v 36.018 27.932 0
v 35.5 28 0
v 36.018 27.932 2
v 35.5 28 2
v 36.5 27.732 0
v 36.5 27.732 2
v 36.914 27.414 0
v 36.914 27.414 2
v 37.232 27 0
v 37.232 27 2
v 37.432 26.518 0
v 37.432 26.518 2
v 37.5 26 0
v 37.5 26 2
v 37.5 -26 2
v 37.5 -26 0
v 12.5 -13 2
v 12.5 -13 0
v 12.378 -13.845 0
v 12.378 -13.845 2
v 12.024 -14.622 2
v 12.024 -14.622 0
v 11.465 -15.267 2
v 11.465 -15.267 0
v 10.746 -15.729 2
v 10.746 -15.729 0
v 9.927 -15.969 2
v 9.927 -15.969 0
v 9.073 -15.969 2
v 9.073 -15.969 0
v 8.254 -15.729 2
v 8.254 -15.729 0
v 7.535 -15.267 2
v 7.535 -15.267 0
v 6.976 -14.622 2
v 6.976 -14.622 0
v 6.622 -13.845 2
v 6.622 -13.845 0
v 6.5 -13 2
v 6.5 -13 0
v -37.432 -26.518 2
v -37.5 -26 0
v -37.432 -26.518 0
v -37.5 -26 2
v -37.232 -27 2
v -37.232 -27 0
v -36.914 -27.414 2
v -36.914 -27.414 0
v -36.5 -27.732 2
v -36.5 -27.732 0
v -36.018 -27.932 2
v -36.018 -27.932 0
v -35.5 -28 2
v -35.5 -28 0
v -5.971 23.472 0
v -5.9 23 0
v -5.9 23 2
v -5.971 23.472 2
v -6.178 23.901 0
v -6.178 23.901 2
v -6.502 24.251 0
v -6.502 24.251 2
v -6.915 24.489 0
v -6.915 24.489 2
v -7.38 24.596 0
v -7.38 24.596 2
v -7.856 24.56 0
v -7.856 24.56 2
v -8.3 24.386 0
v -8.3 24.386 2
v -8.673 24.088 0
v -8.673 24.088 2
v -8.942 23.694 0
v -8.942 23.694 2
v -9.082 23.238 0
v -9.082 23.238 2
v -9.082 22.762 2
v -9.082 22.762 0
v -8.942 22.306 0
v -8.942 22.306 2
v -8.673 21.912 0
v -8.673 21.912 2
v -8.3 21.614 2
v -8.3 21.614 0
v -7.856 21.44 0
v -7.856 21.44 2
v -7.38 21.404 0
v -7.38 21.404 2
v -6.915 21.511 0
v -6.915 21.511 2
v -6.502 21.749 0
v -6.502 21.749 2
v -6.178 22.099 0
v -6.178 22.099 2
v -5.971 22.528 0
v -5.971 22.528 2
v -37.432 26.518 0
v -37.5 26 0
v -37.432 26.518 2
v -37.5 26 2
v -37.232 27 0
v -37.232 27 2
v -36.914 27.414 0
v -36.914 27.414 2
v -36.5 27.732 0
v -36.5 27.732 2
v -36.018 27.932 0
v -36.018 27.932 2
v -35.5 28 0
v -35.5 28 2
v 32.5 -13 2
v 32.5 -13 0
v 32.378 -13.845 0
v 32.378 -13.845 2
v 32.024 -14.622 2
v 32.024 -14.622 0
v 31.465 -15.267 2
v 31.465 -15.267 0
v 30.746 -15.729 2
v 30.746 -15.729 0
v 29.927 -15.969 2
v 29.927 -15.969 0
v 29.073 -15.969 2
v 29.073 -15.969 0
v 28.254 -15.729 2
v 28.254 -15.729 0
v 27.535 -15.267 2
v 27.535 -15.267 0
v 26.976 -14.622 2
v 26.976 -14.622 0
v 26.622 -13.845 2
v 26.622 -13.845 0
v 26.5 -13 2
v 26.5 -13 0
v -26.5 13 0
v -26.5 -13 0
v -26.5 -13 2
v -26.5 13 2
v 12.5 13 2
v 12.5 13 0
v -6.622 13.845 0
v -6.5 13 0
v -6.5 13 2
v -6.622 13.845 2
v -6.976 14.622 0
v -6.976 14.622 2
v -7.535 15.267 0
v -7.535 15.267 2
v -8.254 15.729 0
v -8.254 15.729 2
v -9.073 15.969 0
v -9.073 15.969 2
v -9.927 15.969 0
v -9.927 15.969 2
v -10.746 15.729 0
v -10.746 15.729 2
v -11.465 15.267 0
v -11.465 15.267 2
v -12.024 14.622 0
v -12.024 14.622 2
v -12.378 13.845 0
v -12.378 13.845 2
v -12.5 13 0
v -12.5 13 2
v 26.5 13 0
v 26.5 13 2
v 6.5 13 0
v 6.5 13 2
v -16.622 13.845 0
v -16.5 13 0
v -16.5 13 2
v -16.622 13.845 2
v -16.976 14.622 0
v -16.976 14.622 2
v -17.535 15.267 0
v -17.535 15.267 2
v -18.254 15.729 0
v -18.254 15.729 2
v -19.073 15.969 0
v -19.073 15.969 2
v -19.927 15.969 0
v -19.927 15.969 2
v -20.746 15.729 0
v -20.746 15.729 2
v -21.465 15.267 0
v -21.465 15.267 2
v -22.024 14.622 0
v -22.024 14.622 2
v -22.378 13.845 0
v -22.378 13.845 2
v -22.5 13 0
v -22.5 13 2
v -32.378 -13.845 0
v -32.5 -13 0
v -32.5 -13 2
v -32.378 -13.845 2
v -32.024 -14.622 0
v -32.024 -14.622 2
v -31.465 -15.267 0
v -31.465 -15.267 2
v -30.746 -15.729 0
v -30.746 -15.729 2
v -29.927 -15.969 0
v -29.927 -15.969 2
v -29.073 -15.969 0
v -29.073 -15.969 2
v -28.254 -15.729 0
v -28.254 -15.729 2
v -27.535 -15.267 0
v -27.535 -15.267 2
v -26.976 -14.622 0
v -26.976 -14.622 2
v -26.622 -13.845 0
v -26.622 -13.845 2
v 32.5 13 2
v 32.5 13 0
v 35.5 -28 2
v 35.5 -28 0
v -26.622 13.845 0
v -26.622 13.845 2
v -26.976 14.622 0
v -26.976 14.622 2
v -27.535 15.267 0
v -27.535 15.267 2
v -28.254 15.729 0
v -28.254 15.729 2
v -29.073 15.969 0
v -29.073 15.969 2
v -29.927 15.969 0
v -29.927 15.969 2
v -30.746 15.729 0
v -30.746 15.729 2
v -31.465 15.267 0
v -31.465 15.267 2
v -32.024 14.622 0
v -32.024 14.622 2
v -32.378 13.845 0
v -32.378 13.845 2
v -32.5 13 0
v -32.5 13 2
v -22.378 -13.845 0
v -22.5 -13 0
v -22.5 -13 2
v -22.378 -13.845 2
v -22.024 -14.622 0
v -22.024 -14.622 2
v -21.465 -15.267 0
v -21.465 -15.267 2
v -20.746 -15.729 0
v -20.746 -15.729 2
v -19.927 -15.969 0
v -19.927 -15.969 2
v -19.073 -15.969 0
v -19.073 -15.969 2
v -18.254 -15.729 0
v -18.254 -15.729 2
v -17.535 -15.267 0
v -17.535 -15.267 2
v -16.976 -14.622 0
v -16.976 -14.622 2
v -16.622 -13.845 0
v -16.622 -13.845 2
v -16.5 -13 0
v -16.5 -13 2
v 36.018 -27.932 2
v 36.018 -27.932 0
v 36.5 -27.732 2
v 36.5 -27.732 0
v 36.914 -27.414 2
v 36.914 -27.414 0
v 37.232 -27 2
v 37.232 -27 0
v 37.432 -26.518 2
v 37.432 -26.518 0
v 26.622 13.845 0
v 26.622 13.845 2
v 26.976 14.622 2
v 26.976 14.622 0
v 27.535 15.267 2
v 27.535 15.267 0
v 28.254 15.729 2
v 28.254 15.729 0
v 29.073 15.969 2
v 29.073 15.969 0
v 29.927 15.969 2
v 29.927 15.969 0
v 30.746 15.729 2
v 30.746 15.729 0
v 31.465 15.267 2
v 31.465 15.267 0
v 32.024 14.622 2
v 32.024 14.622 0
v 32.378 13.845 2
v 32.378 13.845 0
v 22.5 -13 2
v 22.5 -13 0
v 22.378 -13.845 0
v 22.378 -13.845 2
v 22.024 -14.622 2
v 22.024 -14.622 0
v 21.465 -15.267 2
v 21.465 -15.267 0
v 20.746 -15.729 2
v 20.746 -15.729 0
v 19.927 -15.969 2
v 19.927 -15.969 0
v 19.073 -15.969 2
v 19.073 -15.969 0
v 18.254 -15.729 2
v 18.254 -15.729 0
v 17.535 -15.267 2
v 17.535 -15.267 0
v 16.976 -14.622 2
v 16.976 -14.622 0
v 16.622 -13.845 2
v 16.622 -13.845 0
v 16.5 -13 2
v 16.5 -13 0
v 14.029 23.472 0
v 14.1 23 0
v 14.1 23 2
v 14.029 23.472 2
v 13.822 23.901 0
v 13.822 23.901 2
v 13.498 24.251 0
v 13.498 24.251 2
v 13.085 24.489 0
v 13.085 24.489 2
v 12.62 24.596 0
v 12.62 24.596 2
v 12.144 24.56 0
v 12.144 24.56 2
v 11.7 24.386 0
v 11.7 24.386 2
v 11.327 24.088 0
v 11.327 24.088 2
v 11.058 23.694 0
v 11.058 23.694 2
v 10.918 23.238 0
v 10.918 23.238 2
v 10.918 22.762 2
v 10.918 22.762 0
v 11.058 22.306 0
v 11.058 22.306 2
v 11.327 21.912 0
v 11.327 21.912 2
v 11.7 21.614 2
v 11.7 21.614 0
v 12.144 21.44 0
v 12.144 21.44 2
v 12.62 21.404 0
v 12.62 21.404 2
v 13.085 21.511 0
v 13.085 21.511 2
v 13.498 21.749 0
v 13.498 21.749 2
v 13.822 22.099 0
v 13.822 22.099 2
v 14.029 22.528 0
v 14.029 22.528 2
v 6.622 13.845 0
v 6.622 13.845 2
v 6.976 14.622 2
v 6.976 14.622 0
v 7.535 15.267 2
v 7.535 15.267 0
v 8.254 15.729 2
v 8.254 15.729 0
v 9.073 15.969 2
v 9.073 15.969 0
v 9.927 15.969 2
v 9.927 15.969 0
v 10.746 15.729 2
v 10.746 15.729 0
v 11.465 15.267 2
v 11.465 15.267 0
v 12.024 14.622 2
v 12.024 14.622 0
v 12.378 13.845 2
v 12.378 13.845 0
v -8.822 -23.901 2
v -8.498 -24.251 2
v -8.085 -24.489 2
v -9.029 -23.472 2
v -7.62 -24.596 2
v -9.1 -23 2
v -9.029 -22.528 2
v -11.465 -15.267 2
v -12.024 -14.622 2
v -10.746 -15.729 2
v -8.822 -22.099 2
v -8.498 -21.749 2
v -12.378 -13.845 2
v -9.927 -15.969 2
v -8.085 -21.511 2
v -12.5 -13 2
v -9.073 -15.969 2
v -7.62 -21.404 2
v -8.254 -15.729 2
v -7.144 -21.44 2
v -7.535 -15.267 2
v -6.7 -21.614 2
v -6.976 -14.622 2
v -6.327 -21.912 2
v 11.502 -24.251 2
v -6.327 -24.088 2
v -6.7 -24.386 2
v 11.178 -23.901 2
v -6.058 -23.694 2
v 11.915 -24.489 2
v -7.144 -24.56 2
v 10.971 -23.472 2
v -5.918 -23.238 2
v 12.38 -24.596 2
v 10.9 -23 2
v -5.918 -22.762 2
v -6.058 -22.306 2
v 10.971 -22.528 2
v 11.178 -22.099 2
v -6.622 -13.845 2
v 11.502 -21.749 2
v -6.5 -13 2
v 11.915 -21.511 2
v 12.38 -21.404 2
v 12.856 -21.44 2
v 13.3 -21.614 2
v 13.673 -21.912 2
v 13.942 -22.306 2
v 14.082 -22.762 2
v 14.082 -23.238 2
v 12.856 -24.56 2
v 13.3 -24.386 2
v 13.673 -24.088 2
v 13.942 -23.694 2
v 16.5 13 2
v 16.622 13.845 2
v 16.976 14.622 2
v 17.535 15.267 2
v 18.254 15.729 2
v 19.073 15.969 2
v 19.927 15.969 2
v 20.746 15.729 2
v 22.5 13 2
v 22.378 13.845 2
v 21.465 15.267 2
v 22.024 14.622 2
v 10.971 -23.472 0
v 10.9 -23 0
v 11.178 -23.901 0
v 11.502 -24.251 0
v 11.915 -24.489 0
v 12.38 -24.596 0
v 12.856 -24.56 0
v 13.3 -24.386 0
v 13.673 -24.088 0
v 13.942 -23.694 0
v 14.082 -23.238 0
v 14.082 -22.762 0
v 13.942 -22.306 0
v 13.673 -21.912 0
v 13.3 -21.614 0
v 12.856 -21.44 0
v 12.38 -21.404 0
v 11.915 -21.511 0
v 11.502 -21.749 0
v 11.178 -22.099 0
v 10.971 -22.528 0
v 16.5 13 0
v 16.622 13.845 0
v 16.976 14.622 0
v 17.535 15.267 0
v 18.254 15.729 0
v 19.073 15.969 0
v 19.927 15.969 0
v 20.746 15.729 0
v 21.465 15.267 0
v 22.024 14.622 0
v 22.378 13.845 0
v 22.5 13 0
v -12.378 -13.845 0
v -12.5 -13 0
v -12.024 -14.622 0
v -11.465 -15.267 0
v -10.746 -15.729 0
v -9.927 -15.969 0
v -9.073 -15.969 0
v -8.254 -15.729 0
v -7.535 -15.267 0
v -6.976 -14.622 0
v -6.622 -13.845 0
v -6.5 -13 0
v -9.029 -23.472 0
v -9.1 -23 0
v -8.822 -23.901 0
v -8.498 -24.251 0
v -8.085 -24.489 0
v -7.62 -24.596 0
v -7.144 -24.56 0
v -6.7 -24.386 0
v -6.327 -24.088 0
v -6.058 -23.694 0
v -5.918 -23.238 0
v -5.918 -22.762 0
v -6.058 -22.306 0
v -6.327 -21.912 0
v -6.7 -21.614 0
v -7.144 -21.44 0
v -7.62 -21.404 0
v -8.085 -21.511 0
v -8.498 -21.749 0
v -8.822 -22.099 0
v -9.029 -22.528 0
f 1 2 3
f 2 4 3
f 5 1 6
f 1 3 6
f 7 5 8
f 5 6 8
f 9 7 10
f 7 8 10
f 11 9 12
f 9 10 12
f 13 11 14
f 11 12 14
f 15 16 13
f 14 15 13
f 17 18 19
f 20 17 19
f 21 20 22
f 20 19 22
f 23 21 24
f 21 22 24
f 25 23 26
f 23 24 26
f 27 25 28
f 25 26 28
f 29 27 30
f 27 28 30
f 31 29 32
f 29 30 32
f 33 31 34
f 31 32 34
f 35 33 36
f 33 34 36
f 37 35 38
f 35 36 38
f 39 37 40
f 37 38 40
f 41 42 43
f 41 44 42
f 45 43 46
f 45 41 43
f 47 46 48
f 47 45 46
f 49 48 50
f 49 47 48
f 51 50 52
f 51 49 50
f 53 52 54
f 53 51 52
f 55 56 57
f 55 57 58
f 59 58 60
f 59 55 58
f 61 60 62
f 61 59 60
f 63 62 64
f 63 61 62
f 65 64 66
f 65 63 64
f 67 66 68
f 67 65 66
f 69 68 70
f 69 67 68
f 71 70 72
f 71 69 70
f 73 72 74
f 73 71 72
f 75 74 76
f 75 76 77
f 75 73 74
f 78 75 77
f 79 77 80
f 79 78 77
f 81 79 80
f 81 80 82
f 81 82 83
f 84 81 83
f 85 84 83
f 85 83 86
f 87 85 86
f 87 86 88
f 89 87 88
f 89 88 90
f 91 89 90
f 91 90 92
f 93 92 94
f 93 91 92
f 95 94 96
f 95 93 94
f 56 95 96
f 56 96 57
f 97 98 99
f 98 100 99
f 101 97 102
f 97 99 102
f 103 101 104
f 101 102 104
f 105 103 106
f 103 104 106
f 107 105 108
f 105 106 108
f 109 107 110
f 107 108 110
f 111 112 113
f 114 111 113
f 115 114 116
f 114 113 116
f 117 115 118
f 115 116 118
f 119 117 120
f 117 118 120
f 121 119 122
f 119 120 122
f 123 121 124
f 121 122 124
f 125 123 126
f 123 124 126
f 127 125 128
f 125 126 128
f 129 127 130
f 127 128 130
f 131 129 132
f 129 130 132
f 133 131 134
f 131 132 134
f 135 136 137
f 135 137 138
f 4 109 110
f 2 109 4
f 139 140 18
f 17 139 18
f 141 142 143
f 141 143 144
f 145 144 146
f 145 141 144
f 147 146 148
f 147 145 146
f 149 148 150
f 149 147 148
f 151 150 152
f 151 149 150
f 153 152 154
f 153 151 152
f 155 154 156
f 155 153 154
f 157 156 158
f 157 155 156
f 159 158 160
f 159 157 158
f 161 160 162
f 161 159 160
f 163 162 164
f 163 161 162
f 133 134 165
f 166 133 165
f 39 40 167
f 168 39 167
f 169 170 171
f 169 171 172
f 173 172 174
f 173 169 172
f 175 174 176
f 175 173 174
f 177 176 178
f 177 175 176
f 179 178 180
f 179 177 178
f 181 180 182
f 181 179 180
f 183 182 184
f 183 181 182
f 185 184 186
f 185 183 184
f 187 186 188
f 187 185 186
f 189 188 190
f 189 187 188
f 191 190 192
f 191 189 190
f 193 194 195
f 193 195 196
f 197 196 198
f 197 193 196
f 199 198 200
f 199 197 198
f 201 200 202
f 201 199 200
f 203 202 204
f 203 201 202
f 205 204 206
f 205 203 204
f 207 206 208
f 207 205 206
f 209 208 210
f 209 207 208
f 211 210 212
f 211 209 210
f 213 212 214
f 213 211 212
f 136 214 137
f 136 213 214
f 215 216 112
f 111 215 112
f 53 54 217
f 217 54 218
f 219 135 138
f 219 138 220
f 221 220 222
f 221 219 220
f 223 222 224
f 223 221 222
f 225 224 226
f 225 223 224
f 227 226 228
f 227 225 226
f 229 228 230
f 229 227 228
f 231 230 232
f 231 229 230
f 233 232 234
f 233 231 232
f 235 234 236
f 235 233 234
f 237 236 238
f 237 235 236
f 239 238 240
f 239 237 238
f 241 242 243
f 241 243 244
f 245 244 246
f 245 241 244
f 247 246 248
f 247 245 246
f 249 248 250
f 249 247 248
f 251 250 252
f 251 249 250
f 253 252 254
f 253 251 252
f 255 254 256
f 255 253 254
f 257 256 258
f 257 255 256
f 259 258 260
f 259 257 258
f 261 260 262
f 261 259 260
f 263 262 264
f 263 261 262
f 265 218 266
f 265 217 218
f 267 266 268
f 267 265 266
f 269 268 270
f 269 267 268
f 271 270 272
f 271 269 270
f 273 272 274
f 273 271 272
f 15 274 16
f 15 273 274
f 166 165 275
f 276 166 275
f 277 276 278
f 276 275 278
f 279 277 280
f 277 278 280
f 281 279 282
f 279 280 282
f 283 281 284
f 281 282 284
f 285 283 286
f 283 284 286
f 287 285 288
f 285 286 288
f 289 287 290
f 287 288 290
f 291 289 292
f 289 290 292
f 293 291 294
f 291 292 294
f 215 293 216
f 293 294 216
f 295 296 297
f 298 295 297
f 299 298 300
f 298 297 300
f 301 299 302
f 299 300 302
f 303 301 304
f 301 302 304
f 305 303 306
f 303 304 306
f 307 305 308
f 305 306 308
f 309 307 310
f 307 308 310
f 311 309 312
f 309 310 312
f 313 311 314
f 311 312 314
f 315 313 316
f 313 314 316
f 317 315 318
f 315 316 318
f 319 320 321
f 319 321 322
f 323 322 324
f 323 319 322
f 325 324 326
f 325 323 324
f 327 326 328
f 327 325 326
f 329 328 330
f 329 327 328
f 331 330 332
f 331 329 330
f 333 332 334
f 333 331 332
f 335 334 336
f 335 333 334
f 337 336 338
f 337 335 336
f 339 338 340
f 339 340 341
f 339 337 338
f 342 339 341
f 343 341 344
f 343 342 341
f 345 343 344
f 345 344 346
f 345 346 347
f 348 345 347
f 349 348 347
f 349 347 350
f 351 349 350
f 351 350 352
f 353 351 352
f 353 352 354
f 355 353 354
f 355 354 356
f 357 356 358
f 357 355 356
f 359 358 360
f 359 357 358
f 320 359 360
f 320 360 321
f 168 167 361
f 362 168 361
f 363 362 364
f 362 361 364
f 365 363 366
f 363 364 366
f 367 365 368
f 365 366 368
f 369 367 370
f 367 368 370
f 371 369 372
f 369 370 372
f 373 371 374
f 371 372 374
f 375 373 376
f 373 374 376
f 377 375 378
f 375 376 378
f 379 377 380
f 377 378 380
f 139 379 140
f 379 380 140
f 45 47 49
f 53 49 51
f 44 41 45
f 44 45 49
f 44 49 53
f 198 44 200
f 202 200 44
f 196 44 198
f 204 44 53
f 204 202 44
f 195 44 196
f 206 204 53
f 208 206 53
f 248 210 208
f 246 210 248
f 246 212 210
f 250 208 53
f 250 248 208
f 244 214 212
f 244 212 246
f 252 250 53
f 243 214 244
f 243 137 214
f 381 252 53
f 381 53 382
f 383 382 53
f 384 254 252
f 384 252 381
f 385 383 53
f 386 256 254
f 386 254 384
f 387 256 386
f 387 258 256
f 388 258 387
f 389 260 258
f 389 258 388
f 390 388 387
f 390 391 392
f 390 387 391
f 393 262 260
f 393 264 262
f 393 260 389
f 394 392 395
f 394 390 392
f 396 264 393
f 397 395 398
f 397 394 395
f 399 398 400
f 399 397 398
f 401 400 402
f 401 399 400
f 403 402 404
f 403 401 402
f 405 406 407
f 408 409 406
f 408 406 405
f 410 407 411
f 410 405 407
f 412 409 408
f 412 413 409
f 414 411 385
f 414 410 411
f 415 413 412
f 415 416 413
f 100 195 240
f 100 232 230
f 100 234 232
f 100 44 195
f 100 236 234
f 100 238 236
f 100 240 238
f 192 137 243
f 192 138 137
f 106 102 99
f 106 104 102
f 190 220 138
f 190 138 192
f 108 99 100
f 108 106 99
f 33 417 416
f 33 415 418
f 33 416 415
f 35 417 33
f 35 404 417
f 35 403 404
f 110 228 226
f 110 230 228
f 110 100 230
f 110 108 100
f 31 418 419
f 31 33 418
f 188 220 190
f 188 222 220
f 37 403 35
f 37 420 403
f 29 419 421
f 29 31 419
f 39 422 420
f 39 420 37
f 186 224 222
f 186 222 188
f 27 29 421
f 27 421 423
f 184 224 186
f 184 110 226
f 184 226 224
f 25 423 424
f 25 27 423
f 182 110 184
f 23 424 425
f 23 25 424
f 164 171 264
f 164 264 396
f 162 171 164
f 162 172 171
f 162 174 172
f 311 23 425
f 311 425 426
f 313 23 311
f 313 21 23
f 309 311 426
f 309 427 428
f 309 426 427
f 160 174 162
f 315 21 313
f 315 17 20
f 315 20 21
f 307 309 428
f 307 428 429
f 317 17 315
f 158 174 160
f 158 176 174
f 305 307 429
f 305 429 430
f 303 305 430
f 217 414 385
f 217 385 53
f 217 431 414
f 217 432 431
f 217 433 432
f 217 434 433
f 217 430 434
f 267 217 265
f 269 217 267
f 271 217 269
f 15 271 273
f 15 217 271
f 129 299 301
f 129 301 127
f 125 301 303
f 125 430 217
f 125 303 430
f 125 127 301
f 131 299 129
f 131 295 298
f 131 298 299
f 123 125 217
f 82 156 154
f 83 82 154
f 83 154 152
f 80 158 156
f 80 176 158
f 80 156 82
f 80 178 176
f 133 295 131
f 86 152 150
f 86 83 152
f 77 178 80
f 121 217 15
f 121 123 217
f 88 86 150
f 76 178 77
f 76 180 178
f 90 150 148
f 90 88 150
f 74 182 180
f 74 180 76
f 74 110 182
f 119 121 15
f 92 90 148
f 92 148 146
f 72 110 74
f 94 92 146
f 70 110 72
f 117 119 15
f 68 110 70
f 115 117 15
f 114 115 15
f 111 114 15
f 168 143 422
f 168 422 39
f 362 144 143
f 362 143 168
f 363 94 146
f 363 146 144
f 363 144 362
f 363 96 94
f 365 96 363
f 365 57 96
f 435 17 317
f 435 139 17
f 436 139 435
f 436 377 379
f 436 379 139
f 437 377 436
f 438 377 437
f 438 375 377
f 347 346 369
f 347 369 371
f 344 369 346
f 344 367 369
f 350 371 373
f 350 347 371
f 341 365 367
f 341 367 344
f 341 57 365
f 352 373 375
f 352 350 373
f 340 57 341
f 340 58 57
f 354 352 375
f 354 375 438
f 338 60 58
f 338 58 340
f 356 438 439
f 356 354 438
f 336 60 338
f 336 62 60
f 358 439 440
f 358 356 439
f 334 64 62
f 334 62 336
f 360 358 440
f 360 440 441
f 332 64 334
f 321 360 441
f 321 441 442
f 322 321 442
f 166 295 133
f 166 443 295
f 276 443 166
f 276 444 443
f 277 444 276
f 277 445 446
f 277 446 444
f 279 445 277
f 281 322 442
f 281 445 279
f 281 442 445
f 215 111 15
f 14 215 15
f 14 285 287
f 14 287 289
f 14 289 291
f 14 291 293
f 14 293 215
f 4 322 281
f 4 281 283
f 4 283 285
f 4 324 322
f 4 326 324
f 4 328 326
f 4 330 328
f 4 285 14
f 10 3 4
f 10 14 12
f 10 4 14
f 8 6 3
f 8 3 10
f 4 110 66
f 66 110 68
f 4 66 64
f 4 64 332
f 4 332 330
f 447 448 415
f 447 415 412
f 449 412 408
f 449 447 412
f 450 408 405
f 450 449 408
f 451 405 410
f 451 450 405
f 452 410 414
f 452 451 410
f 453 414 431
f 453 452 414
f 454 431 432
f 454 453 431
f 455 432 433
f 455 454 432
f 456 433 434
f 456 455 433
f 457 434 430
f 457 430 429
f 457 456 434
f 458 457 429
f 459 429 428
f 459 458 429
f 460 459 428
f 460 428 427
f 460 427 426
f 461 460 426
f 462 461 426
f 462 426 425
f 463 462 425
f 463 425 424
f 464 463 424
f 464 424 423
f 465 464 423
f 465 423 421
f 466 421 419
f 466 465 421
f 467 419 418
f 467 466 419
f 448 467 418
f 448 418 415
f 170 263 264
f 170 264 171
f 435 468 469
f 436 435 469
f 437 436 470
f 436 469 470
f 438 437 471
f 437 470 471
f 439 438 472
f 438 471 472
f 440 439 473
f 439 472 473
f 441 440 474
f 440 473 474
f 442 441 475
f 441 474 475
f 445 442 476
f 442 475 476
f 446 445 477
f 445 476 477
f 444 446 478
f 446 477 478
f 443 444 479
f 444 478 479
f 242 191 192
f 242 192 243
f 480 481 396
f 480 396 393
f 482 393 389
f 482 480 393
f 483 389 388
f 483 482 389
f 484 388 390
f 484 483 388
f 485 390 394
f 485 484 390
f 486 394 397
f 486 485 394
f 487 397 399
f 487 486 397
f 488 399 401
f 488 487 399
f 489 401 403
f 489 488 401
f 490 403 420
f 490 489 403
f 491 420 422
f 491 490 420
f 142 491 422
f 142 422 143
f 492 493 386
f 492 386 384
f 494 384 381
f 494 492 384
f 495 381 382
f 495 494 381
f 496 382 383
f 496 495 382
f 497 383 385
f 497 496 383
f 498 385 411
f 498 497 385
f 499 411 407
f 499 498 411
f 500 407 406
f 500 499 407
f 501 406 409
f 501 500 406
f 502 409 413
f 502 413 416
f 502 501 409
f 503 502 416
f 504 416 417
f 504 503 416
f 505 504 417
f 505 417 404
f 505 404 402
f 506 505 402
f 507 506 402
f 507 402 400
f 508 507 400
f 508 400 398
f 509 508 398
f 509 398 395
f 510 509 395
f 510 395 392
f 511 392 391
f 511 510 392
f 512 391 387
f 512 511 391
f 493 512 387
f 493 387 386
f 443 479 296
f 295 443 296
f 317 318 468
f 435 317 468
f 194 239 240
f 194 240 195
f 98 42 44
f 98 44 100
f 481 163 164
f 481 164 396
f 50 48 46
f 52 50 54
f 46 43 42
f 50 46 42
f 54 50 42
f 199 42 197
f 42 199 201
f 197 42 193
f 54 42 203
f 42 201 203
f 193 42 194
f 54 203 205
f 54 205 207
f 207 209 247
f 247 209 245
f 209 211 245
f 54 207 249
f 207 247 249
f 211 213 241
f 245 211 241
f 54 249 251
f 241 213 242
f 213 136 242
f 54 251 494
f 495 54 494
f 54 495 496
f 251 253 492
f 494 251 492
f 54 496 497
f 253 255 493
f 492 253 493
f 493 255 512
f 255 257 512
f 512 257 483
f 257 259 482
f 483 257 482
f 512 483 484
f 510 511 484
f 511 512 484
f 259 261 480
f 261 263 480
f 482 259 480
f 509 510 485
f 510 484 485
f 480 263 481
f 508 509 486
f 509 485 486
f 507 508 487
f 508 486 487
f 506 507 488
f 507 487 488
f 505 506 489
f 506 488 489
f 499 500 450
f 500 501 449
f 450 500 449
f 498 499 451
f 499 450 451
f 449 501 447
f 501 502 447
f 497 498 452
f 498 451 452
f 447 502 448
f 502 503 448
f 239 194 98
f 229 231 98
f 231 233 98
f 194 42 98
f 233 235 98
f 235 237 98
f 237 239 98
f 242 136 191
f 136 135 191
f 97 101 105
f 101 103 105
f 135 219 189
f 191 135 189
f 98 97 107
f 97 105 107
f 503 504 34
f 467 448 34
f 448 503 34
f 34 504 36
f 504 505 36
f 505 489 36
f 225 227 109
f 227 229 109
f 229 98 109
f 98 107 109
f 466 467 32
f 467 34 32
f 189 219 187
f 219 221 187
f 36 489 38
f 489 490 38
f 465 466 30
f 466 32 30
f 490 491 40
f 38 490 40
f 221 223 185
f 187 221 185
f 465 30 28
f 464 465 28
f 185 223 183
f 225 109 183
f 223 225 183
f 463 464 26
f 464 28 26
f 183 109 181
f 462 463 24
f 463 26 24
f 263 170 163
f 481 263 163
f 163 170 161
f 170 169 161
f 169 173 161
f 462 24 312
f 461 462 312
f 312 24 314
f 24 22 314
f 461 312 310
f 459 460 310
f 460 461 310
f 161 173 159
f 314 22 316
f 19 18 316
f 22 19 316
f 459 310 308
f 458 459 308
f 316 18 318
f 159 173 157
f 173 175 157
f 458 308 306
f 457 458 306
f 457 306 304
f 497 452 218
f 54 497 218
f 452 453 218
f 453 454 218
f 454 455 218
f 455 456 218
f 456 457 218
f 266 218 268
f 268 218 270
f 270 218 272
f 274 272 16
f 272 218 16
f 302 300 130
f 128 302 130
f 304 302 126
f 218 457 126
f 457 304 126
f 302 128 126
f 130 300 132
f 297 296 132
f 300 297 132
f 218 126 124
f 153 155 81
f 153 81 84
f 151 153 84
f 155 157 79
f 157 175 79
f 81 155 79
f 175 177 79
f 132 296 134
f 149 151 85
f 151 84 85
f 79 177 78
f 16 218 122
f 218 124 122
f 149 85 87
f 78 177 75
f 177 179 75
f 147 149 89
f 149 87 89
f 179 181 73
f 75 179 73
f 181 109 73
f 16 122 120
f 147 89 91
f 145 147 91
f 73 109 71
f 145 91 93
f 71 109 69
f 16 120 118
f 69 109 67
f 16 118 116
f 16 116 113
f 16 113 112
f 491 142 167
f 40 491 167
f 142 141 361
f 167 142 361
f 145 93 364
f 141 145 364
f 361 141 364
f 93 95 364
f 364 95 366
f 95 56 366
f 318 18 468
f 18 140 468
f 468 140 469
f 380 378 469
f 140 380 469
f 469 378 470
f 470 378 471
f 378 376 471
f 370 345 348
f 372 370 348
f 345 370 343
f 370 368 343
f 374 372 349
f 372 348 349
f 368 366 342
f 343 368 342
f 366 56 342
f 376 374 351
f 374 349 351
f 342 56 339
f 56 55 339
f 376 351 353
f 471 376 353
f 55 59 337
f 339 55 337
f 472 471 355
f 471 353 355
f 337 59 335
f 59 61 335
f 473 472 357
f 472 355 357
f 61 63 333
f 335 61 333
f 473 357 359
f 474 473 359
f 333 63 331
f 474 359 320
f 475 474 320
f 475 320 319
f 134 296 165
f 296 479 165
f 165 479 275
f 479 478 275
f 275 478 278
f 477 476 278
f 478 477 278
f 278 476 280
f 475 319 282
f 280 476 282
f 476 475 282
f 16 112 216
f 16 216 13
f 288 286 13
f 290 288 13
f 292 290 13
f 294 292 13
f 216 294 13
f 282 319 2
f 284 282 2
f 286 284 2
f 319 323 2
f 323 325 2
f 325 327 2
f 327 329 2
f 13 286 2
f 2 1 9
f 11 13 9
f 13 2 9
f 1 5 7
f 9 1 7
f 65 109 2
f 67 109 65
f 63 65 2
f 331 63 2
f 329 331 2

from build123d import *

# Parameters (mm, degrees)
SKETCH_1_W      = 75
SKETCH_1_H      = 56
SKETCH_1_R      = 1.6
EXTRUDE_1_DEPTH = 2
FILLET_1_R      = 2


with BuildPart() as part:
    # 草图1 → 凸台-拉伸1 (new body)
    with BuildSketch(Plane.XY):
        Rectangle(SKETCH_1_W, SKETCH_1_H)
        with Locations((12.5, 23)):
            Circle(SKETCH_1_R, mode=Mode.SUBTRACT)
        with Locations((-7.5, 23)):
            Circle(SKETCH_1_R, mode=Mode.SUBTRACT)
        with Locations(Location((-7.5, -23, 0), (0, 0, 180))):
            Circle(SKETCH_1_R, mode=Mode.SUBTRACT)
        with Locations(Location((12.5, -23, 0), (0, 0, 180))):
            Circle(SKETCH_1_R, mode=Mode.SUBTRACT)
        with BuildLine():
            Line((32.5, 13), (32.5, -13))
            ThreePointArc((32.5, -13), (29.5, -16), (26.5, -13))
            Line((26.5, -13), (26.5, 13))
            ThreePointArc((26.5, 13), (29.5, 16), (32.5, 13))
        make_face(mode=Mode.SUBTRACT)
        with BuildLine():
            Line((22.5, 13), (22.5, -13))
            ThreePointArc((22.5, -13), (19.5, -16), (16.5, -13))
            Line((16.5, -13), (16.5, 13))
            ThreePointArc((16.5, 13), (19.5, 16), (22.5, 13))
        make_face(mode=Mode.SUBTRACT)
        with BuildLine():
            Line((12.5, 13), (12.5, -13))
            ThreePointArc((12.5, -13), (9.5, -16), (6.5, -13))
            Line((6.5, -13), (6.5, 13))
            ThreePointArc((6.5, 13), (9.5, 16), (12.5, 13))
        make_face(mode=Mode.SUBTRACT)
        with BuildLine():
            Line((-12.5, 13), (-12.5, -13))
            ThreePointArc((-12.5, -13), (-9.5, -16), (-6.5, -13))
            Line((-6.5, -13), (-6.5, 13))
            ThreePointArc((-6.5, 13), (-9.5, 16), (-12.5, 13))
        make_face(mode=Mode.SUBTRACT)
        with BuildLine():
            Line((-22.5, 13), (-22.5, -13))
            ThreePointArc((-22.5, -13), (-19.5, -16), (-16.5, -13))
            Line((-16.5, -13), (-16.5, 13))
            ThreePointArc((-16.5, 13), (-19.5, 16), (-22.5, 13))
        make_face(mode=Mode.SUBTRACT)
        with BuildLine():
            Line((-32.5, 13), (-32.5, -13))
            ThreePointArc((-32.5, -13), (-29.5, -16), (-26.5, -13))
            Line((-26.5, -13), (-26.5, 13))
            ThreePointArc((-26.5, 13), (-29.5, 16), (-32.5, 13))
        make_face(mode=Mode.SUBTRACT)
    extrude(amount=EXTRUDE_1_DEPTH)

    # 圆角1
    fillet_1_edges = [part.edges().sort_by_distance(p)[0] for p in [
        (-37.5, 28, 1),
        (37.5, 28, 1),
        (37.5, -28, 1),
        (-37.5, -28, 1),
    ]]
    fillet(fillet_1_edges, radius=FILLET_1_R)


solid = part.part
